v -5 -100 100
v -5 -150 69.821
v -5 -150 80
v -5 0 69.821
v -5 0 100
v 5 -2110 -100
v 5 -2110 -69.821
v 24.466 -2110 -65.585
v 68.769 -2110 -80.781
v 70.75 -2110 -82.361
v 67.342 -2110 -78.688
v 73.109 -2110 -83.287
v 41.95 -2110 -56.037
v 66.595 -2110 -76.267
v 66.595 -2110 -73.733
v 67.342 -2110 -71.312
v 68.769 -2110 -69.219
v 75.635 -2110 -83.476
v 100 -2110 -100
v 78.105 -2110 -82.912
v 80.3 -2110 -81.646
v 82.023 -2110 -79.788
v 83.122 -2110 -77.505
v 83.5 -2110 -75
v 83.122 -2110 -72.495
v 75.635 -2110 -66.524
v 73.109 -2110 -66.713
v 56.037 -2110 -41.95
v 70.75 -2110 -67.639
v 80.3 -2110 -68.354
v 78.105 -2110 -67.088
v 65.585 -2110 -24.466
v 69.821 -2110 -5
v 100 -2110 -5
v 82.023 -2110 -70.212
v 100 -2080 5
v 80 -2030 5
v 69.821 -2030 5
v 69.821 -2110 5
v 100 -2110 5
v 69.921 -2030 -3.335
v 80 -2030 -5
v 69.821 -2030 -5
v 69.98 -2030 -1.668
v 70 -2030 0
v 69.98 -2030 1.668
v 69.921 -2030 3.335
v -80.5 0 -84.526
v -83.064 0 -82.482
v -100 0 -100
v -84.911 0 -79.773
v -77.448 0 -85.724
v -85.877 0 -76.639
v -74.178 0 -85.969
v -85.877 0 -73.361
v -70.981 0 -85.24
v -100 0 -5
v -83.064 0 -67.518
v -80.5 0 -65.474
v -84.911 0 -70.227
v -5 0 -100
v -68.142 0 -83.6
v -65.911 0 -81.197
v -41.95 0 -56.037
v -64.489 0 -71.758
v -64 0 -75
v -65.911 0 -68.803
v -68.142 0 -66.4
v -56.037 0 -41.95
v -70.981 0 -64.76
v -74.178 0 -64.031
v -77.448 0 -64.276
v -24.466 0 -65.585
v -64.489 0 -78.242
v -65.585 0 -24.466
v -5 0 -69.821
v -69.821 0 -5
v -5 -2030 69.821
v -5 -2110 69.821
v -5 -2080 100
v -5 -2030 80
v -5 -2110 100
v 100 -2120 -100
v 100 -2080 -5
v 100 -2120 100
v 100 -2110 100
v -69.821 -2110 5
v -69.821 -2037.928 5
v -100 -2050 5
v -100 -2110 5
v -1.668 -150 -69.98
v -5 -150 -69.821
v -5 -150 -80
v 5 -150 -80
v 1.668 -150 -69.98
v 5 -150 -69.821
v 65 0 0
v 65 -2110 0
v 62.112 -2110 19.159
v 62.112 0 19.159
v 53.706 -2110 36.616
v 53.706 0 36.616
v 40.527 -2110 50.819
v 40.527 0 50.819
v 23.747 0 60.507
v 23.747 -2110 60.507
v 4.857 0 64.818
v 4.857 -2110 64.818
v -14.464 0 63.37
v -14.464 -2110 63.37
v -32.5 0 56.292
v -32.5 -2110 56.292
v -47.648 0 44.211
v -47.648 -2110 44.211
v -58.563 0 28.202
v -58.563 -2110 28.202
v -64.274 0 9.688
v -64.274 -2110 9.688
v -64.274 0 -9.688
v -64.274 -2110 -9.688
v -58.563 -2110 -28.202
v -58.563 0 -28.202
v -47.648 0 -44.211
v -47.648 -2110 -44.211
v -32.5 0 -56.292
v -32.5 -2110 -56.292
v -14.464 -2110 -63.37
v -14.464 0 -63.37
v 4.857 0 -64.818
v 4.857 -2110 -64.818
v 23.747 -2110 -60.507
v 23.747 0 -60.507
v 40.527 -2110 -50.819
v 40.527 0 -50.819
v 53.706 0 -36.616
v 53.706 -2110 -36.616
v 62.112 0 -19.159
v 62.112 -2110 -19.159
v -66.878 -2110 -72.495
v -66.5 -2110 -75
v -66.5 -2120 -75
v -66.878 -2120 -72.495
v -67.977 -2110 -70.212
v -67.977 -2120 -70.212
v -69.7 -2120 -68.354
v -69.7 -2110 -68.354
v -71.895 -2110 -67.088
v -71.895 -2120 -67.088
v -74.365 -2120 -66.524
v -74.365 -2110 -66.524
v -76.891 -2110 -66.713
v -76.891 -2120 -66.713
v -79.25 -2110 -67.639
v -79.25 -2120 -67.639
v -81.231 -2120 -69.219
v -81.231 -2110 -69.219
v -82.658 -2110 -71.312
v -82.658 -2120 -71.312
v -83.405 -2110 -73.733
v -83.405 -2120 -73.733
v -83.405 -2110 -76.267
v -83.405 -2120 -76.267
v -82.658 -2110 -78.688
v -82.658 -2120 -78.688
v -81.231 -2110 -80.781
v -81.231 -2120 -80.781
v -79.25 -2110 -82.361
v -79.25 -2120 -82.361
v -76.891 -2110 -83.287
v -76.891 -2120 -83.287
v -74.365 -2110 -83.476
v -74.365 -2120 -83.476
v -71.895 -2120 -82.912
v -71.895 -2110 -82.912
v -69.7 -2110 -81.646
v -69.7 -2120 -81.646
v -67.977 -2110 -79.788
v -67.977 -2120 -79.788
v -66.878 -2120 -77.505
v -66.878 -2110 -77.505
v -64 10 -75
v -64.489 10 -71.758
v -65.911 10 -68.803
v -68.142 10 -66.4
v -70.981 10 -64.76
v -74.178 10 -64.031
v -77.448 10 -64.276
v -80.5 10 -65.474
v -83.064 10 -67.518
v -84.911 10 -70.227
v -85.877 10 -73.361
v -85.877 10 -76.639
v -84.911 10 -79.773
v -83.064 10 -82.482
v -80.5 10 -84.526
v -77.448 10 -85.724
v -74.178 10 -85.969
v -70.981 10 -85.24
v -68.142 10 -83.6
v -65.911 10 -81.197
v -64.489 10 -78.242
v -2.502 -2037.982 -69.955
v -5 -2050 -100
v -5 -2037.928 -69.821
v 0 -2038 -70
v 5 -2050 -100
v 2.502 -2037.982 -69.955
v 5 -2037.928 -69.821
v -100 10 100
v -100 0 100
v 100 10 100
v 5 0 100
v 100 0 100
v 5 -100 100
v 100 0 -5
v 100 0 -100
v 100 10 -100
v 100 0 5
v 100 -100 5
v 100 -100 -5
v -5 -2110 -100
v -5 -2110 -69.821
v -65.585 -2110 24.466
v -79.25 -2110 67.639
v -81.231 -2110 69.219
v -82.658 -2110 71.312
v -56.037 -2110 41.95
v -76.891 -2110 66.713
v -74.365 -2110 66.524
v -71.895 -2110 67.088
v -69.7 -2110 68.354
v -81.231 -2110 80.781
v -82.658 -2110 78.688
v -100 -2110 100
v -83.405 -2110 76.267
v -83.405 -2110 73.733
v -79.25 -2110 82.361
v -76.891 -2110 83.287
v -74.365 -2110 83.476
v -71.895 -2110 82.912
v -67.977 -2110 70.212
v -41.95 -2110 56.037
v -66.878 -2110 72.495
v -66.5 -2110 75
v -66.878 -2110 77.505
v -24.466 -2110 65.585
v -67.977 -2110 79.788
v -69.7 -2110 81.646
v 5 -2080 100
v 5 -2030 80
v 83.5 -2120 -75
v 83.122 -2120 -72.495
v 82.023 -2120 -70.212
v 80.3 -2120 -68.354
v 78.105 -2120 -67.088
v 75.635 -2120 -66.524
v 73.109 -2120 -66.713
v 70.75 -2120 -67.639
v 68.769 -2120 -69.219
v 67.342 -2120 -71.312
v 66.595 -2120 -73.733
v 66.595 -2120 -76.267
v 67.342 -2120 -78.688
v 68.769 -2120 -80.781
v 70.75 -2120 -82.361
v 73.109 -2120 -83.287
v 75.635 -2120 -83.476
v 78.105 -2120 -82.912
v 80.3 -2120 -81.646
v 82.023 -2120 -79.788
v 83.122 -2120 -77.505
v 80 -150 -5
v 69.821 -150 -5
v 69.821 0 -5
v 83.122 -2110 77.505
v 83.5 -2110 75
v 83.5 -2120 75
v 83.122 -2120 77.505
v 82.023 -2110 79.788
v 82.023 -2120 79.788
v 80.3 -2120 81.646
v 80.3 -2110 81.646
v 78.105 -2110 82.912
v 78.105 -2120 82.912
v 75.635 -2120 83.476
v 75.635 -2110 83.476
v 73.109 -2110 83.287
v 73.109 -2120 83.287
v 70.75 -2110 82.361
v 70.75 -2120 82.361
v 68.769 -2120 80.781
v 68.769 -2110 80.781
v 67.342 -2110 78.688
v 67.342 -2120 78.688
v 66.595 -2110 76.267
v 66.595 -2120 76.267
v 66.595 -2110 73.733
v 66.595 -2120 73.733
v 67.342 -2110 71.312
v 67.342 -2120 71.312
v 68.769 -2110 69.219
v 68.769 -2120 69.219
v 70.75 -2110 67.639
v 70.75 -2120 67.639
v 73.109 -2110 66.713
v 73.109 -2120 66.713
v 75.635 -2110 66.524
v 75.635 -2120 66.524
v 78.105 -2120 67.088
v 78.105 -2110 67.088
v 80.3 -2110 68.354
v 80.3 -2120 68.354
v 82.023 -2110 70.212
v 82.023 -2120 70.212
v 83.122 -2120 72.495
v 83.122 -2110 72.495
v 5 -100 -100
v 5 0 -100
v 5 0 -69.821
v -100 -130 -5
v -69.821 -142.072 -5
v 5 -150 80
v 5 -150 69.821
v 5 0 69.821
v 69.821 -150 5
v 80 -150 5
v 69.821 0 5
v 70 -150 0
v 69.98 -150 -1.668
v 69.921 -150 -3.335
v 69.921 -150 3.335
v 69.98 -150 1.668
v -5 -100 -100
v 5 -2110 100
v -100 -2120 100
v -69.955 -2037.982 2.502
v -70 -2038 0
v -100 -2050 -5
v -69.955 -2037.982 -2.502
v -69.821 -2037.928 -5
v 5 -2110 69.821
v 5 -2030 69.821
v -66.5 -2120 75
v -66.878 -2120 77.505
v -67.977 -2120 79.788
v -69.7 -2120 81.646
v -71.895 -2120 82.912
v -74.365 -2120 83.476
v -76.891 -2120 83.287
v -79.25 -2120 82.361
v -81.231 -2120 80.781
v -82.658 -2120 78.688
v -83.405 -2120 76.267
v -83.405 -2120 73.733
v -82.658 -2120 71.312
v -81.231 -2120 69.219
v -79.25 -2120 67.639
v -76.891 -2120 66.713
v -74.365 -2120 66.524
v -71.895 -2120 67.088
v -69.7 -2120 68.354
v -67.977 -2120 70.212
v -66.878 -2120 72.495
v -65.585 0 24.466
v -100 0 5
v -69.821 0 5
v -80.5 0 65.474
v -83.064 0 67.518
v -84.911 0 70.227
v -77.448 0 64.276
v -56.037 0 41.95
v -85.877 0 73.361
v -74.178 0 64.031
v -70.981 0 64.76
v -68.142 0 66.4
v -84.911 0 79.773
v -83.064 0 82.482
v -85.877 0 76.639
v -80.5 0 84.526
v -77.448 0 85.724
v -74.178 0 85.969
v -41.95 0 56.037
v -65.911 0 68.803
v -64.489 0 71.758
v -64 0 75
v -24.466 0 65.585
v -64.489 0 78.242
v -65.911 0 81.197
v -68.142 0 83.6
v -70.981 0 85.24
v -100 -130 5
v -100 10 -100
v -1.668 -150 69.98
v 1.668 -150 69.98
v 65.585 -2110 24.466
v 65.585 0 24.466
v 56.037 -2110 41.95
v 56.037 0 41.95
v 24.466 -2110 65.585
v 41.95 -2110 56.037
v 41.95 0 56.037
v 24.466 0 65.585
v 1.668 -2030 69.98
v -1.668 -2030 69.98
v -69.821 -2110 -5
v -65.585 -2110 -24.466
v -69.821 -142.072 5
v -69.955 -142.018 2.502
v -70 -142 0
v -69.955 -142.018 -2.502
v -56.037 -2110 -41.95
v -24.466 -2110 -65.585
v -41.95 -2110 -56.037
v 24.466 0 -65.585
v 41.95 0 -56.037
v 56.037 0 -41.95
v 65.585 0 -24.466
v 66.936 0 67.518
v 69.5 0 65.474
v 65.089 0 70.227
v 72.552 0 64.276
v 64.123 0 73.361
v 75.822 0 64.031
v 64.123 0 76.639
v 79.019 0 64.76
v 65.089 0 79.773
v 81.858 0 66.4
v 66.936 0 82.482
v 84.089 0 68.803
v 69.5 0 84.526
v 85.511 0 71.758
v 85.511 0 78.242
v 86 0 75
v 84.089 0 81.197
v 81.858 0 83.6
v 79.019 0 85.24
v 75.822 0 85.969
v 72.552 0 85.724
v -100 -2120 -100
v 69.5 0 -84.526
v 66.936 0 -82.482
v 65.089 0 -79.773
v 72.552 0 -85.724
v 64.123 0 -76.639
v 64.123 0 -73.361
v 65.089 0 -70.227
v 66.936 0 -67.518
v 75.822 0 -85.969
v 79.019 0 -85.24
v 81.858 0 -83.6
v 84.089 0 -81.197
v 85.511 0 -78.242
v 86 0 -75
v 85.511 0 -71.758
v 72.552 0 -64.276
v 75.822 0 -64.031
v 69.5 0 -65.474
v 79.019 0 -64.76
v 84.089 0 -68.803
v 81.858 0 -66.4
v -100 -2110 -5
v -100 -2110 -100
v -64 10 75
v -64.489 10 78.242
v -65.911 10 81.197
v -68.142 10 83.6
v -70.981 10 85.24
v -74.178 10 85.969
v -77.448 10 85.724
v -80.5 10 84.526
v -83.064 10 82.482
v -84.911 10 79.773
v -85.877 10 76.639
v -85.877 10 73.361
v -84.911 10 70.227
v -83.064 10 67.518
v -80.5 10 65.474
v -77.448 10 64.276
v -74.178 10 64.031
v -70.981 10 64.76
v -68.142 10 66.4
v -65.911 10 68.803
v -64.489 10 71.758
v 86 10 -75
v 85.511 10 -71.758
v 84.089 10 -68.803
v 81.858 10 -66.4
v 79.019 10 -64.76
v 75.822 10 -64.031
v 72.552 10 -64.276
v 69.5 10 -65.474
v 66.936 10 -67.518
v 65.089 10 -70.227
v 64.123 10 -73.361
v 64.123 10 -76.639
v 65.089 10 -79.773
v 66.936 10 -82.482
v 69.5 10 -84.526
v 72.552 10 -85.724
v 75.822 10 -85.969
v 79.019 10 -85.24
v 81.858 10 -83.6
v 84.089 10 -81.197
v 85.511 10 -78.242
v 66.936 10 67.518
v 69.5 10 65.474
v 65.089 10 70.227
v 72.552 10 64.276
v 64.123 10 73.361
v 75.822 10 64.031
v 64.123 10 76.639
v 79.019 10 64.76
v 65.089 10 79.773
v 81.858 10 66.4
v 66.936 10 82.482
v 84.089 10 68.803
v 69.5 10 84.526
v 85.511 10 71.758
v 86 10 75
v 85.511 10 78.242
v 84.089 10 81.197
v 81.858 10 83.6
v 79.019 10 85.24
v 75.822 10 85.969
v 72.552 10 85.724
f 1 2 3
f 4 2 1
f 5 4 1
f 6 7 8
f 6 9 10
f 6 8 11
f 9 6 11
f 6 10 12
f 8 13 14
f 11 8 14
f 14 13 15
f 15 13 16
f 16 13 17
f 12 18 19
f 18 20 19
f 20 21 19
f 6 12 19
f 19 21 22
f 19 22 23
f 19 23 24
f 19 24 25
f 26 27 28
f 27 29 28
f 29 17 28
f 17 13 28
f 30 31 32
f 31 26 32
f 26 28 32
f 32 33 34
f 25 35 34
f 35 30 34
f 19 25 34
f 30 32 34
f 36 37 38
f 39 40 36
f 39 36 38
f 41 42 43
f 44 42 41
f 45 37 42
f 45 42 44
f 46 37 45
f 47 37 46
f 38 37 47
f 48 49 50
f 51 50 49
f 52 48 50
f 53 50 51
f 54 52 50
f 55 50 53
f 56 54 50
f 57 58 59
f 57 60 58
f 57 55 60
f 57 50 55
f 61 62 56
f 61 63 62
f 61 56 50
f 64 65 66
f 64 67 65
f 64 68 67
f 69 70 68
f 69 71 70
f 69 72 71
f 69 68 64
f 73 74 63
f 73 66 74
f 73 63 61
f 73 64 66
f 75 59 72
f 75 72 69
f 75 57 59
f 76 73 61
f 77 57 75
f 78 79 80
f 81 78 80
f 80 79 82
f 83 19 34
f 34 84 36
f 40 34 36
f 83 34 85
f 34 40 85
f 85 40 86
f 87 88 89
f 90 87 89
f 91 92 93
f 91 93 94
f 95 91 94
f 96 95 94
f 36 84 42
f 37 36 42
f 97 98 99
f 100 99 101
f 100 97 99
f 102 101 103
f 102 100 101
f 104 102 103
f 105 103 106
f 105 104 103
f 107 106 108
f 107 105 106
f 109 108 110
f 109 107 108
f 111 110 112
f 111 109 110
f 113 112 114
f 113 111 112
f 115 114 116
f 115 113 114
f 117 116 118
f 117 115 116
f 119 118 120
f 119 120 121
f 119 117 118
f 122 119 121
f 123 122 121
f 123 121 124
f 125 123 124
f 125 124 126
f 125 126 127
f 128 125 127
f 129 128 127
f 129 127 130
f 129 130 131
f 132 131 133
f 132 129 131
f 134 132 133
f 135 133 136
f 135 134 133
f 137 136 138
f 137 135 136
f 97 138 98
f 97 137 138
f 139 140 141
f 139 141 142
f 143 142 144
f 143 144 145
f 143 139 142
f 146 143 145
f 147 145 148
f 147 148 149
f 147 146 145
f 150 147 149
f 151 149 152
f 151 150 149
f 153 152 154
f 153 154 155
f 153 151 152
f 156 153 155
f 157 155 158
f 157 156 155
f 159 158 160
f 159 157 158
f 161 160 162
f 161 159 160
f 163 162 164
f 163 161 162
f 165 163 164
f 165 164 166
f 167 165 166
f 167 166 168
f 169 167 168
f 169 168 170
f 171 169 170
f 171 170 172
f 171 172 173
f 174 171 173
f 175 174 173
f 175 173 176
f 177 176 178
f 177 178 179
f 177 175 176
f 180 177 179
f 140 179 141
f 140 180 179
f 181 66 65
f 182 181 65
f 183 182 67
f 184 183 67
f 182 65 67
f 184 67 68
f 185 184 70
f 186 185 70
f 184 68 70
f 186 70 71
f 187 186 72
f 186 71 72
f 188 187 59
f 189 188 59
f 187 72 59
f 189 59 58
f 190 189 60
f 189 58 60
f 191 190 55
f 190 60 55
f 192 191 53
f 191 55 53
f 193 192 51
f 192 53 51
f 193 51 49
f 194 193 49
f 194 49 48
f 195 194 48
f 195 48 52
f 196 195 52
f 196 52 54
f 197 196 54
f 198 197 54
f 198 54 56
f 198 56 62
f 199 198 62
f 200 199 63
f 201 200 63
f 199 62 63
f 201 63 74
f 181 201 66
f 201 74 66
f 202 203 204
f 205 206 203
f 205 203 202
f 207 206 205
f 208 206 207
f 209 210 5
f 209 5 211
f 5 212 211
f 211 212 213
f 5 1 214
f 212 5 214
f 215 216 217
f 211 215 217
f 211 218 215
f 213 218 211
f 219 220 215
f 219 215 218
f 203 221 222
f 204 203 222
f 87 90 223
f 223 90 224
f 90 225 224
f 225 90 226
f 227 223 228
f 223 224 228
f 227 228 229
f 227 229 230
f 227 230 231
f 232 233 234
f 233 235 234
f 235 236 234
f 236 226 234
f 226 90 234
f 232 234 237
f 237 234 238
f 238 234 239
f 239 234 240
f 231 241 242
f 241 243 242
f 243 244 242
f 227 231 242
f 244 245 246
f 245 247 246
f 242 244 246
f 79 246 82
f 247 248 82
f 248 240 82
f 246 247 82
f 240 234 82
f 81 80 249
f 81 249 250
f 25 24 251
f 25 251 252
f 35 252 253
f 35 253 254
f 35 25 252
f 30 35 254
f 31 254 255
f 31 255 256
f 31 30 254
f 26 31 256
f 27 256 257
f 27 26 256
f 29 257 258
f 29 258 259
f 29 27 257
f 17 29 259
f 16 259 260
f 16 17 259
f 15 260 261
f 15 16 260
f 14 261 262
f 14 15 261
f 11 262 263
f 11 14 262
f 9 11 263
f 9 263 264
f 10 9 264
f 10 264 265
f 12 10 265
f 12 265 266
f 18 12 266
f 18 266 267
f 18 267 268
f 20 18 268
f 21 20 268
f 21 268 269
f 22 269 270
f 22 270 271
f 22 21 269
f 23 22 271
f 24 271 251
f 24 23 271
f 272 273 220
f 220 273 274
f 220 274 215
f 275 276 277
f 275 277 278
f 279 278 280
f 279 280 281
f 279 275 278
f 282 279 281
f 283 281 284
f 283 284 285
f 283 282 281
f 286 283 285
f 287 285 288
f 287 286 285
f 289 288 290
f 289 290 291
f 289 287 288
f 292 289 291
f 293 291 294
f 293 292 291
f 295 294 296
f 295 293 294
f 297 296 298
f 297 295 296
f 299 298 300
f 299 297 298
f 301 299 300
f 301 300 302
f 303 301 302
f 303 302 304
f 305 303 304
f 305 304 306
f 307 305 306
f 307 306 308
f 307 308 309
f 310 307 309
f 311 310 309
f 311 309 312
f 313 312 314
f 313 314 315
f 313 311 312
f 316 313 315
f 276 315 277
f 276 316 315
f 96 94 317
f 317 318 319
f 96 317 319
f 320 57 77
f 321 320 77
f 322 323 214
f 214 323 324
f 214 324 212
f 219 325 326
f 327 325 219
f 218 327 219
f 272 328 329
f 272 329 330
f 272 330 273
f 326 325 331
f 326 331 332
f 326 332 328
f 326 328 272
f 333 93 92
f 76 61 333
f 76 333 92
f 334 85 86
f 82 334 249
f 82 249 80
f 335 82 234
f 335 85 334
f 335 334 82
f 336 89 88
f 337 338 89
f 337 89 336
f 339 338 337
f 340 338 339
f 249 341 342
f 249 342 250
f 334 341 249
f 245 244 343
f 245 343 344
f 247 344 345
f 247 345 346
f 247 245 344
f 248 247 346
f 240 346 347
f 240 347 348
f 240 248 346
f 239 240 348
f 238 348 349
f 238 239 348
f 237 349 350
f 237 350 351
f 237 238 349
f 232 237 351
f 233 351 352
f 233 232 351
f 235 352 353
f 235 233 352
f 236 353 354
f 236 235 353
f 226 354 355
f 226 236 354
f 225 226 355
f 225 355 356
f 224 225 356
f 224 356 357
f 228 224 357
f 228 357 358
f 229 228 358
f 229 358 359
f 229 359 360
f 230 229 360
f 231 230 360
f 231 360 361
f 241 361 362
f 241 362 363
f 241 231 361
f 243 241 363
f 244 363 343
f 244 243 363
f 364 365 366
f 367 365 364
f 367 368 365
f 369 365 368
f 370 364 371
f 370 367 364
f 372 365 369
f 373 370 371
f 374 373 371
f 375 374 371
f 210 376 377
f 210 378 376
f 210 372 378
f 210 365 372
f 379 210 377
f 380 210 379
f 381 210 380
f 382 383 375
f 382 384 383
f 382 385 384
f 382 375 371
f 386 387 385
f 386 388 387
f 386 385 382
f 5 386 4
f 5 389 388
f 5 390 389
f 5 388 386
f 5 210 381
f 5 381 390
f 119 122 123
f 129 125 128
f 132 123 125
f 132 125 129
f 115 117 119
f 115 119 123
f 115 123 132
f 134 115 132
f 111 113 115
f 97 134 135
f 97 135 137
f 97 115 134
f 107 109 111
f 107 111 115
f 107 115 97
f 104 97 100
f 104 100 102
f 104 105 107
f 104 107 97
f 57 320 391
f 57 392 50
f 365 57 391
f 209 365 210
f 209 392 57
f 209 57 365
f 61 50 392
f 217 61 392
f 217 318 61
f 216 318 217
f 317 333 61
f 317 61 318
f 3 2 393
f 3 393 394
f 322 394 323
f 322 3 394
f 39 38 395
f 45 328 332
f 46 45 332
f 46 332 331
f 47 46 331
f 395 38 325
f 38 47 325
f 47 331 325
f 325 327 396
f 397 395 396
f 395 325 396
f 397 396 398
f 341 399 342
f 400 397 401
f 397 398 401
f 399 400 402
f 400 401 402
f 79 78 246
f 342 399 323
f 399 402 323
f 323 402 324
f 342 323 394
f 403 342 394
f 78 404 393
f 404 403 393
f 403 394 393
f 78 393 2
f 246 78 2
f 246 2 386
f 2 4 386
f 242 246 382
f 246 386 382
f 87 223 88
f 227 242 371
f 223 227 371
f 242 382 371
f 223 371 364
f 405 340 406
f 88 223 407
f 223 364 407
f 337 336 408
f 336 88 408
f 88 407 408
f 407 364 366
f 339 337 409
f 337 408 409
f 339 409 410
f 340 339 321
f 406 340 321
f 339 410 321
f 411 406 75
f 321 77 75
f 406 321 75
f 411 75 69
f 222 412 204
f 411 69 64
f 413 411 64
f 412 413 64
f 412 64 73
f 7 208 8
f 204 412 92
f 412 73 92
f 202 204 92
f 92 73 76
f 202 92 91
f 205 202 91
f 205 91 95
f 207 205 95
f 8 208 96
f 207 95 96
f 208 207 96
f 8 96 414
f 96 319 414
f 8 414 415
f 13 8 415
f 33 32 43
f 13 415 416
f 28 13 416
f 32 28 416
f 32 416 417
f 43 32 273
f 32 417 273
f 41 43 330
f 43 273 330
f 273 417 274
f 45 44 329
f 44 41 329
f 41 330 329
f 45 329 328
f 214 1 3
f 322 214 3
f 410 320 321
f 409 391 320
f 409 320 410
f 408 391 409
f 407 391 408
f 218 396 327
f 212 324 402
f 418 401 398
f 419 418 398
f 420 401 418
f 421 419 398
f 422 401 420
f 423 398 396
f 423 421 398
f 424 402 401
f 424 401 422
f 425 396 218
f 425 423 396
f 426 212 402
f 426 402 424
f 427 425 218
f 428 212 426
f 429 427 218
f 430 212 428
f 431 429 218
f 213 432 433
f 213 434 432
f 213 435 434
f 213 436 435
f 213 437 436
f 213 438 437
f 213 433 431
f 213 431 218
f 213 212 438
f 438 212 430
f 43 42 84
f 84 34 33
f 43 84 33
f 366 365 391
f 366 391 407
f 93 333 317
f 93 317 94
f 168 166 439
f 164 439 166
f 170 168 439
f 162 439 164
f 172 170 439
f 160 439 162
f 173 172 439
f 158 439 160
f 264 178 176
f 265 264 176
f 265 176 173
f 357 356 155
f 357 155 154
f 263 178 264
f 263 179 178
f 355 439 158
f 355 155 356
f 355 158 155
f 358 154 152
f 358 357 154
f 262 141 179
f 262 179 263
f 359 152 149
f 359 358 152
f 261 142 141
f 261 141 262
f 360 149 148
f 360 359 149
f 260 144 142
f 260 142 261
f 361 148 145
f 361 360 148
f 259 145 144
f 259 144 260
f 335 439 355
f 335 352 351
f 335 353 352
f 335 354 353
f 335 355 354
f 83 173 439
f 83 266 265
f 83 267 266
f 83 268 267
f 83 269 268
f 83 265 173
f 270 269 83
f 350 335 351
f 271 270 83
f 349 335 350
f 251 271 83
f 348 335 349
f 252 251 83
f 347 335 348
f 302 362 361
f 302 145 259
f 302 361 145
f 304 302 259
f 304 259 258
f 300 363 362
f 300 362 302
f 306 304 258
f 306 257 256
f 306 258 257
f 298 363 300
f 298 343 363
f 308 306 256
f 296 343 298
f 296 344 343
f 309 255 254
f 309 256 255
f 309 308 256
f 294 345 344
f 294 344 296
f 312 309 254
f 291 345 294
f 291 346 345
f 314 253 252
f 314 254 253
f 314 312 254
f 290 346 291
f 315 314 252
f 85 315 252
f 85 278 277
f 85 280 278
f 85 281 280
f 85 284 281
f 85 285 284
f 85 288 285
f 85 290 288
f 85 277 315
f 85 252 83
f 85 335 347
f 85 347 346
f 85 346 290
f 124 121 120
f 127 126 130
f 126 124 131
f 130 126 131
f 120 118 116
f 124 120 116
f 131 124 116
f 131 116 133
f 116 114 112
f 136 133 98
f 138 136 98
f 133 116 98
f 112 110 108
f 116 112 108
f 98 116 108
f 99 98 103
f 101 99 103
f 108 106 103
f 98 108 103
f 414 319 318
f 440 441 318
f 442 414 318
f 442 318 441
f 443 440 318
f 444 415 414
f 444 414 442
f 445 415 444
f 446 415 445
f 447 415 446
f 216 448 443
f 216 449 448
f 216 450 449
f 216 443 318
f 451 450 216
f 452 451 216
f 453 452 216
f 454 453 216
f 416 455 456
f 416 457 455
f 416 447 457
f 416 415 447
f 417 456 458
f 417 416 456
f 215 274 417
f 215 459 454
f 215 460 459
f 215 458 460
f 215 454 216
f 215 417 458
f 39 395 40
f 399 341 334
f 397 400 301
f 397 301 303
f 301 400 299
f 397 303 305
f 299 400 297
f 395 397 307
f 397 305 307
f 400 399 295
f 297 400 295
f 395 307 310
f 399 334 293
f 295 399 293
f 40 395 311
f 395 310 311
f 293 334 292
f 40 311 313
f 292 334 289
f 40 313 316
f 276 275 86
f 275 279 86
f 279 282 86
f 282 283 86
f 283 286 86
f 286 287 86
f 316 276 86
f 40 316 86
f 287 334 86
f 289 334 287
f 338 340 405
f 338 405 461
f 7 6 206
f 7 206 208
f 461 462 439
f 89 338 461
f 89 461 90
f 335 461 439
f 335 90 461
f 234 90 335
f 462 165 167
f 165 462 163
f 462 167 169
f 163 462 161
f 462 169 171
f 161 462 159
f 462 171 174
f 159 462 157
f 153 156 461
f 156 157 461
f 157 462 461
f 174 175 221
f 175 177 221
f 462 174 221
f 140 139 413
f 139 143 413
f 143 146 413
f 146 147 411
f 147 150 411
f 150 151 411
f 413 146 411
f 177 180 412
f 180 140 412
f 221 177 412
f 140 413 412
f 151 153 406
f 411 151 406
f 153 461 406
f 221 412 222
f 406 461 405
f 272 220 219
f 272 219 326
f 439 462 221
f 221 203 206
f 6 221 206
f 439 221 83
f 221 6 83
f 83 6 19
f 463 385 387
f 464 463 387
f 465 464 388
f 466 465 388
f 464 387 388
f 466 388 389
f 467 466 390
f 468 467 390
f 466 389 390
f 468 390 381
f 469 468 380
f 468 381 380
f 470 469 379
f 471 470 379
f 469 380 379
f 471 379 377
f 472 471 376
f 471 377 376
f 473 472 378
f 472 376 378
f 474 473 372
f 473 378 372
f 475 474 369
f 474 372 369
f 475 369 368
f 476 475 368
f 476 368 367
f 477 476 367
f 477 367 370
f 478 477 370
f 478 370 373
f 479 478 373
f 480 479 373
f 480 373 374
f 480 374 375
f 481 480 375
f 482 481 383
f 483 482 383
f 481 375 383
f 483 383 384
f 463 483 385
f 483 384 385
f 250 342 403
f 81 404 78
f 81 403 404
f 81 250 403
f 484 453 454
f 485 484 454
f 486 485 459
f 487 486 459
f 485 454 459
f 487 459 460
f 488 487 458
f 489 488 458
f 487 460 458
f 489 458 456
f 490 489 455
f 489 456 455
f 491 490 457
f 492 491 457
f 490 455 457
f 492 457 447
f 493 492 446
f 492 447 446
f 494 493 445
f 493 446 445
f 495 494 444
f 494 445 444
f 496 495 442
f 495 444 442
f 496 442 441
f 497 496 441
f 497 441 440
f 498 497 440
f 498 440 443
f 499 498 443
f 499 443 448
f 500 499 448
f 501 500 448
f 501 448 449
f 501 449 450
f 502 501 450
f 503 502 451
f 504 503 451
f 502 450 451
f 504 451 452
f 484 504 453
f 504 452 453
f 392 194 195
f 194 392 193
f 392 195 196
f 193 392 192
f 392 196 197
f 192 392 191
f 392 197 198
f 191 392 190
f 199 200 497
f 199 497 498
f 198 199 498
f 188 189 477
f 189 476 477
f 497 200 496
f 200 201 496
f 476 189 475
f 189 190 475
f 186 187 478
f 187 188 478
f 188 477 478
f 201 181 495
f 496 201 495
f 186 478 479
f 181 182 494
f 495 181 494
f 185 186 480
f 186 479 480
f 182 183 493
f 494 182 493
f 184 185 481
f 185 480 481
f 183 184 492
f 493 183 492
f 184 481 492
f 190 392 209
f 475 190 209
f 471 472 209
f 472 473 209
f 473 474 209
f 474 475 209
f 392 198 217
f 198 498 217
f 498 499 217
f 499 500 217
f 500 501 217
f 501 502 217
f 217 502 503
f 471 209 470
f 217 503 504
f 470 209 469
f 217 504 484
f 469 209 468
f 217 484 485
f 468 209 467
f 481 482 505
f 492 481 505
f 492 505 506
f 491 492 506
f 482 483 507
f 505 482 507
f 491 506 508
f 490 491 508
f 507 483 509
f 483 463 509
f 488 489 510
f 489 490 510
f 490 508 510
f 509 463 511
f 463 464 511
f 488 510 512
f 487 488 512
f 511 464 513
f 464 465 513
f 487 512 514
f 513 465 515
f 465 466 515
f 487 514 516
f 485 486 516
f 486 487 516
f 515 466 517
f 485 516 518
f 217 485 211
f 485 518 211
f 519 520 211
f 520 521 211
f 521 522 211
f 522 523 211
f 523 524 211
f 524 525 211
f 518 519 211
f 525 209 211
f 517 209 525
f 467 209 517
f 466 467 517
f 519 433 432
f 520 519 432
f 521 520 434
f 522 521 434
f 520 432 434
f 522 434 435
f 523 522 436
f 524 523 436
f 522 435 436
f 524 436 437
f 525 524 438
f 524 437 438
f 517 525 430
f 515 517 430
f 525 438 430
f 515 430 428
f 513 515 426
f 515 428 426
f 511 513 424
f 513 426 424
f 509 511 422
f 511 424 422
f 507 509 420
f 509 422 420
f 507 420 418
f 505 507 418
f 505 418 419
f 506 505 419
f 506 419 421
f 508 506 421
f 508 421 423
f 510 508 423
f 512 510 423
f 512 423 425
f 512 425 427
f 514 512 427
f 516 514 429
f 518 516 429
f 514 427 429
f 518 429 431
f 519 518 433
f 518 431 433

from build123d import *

# Parameters (mm, degrees)
F0_R          = 70
F0_R_2        = 65
F1_DEPTH      = 2110
F2_W          = 200
F2_H          = 200
F2_R          = 11
F3_DEPTH      = 10
F4_W          = 30.1787997812
F4_H          = 10
F4_W_2        = 10
F4_H_2        = 30.1787997812
F5_DEPTH      = 150
F6_T1_DEPTH   = 269.311363913
F6_T3_DEPTH   = 269.311363913
F6_T8_DEPTH   = 269.311363913
F6_S9_R       = 70
F6_T10_DEPTH  = 139
F8_W          = 200
F8_H          = 200
F8_R          = 8.5
F9_DEPTH      = 10
F10_W         = 10
F10_H         = 30.1787997812
F10_W_2       = 30.1787997812
F10_H_2       = 10
F11_DEPTH     = 80
F12_T1_DEPTH  = 269.311363913
F12_T3_DEPTH  = 269.311363913
F12_T8_DEPTH  = 269.311363913
F12_S9_R      = 70
F12_T10_DEPTH = 139
F12_T14_DEPTH = 269.311363913
F12_S15_R     = 70
F12_T16_DEPTH = 139


# Not quite as in the source:
# - a fillet or chamfer that OpenCascade refuses, or shapes differently, is made with other operations: its cross-section is extruded or revolved along the edge and cut away or added


with BuildPart() as f1:
    # F0 (on Front) → F1 (new body)
    with BuildSketch(Plane.XZ):
        Circle(F0_R)
        Circle(F0_R_2, mode=Mode.SUBTRACT)
    extrude(amount=F1_DEPTH)

    # F2 (on Front) → F3 (join)
    with BuildSketch(Plane.XZ):
        Rectangle(F2_W, F2_H)
        with Locations((-75, -75)):
            Circle(F2_R, mode=Mode.SUBTRACT)
        with Locations((75, -75)):
            Circle(F2_R, mode=Mode.SUBTRACT)
        with Locations((-75, 75)):
            Circle(F2_R, mode=Mode.SUBTRACT)
        with Locations((75, 75)):
            Circle(F2_R, mode=Mode.SUBTRACT)
    extrude(amount=-F3_DEPTH)

    # F4 (on Front) → F5 (join)
    with BuildSketch(Plane.XZ):
        with Locations((-84.9106001094, 0)):
            Rectangle(F4_W, F4_H)
        with Locations((0, 84.9106001094)):
            Rectangle(F4_W_2, F4_H_2)
        with Locations((84.9106001094, 0)):
            Rectangle(F4_W, F4_H)
        with Locations((0, -84.9106001094)):
            Rectangle(F4_W_2, F4_H_2)
    extrude(amount=F5_DEPTH)

    # F6: chamfer of 50 x 20 on 4 edges, made by hand

    # F6_s2 → F6_t1 (cut)
    with BuildSketch(Plane.YZ.offset(-134.6556819565)):
        Polygon((-100, 100), (-150, 80), (-150, 100), align=None)
        Polygon((-100, -100), (-150, -80), (-150, -100), align=None)
    extrude(amount=F6_T1_DEPTH, mode=Mode.SUBTRACT)

    # F6_s4 → F6_t3 (cut)
    with BuildSketch(Plane.XY.offset(-134.6556819565)):
        Polygon((100, -100), (80, -150), (100, -150), align=None)
    extrude(amount=F6_T3_DEPTH, mode=Mode.SUBTRACT)


with BuildPart() as f6_tool6:
    # F6_s7 → F6_t8 (new body)
    with BuildSketch(Plane.XY.offset(134.6556819565)):
        Polygon((-100, -130), (-50, -150), (-100, -150), align=None)
    extrude(amount=-F6_T8_DEPTH)

    # F6_s9 → F6_t10 (cut, symmetric)
    with BuildSketch(Plane.XZ.offset(140)):
        Circle(F6_S9_R)
    extrude(amount=F6_T10_DEPTH, both=True, mode=Mode.SUBTRACT)


with BuildPart() as f1_1:
    add(f1.part)

    # F6_t5: cut F6_tool6
    add(f6_tool6.part, mode=Mode.SUBTRACT)

    # F8 (on offset) → F9 (join)
    with BuildSketch(Plane.XZ.offset(2110)):
        Rectangle(F8_W, F8_H)
        with Locations((-75, -75)):
            Circle(F8_R, mode=Mode.SUBTRACT)
        with Locations((75, -75)):
            Circle(F8_R, mode=Mode.SUBTRACT)
        with Locations((-75, 75)):
            Circle(F8_R, mode=Mode.SUBTRACT)
        with Locations((75, 75)):
            Circle(F8_R, mode=Mode.SUBTRACT)
    extrude(amount=F9_DEPTH)

    # F10 (on face) → F11 (join)
    with BuildSketch(Plane(origin=(0, -2110, 0), x_dir=(-1, 0, 0), z_dir=(0, 1, 0))):
        with Locations((0, 84.9106001094)):
            Rectangle(F10_W, F10_H)
        with Locations((84.9106001094, 0)):
            Rectangle(F10_W_2, F10_H_2)
        with Locations((0, -84.9106001094)):
            Rectangle(F10_W, F10_H)
        with Locations((-84.9106001094, 0)):
            Rectangle(F10_W_2, F10_H_2)
    extrude(amount=F11_DEPTH)

    # F12: chamfer of 20 x 50 on 4 edges, made by hand

    # F12_s2 → F12_t1 (cut)
    with BuildSketch(Plane.YZ.offset(-134.6556819565)):
        Polygon((-2080, 100), (-2030, 80), (-2030, 100), align=None)
    extrude(amount=F12_T1_DEPTH, mode=Mode.SUBTRACT)

    # F12_s4 → F12_t3 (cut)
    with BuildSketch(Plane.XY.offset(-134.6556819565)):
        Polygon((100, -2080), (80, -2030), (100, -2030), align=None)
    extrude(amount=F12_T3_DEPTH, mode=Mode.SUBTRACT)


with BuildPart() as f12_tool6:
    # F12_s7 → F12_t8 (new body)
    with BuildSketch(Plane.XY.offset(-134.6556819565)):
        Polygon((-100, -2050), (-50, -2030), (-100, -2030), align=None)
    extrude(amount=F12_T8_DEPTH)

    # F12_s9 → F12_t10 (cut, symmetric)
    with BuildSketch(Plane.XZ.offset(2040)):
        Circle(F12_S9_R)
    extrude(amount=F12_T10_DEPTH, both=True, mode=Mode.SUBTRACT)


with BuildPart() as f1_2:
    add(f1_1.part)

    # F12_t5: cut F12_tool6
    add(f12_tool6.part, mode=Mode.SUBTRACT)


with BuildPart() as f12_tool12:
    # F12_s13 → F12_t14 (new body)
    with BuildSketch(Plane.YZ.offset(134.6556819565)):
        Polygon((-2050, -100), (-2030, -50), (-2030, -100), align=None)
    extrude(amount=-F12_T14_DEPTH)

    # F12_s15 → F12_t16 (cut, symmetric)
    with BuildSketch(Plane.XZ.offset(2040)):
        Circle(F12_S15_R)
    extrude(amount=F12_T16_DEPTH, both=True, mode=Mode.SUBTRACT)


with BuildPart() as f1_3:
    add(f1_2.part)

    # F12_t11: cut F12_tool12
    add(f12_tool12.part, mode=Mode.SUBTRACT)


solid = f1_3.part
